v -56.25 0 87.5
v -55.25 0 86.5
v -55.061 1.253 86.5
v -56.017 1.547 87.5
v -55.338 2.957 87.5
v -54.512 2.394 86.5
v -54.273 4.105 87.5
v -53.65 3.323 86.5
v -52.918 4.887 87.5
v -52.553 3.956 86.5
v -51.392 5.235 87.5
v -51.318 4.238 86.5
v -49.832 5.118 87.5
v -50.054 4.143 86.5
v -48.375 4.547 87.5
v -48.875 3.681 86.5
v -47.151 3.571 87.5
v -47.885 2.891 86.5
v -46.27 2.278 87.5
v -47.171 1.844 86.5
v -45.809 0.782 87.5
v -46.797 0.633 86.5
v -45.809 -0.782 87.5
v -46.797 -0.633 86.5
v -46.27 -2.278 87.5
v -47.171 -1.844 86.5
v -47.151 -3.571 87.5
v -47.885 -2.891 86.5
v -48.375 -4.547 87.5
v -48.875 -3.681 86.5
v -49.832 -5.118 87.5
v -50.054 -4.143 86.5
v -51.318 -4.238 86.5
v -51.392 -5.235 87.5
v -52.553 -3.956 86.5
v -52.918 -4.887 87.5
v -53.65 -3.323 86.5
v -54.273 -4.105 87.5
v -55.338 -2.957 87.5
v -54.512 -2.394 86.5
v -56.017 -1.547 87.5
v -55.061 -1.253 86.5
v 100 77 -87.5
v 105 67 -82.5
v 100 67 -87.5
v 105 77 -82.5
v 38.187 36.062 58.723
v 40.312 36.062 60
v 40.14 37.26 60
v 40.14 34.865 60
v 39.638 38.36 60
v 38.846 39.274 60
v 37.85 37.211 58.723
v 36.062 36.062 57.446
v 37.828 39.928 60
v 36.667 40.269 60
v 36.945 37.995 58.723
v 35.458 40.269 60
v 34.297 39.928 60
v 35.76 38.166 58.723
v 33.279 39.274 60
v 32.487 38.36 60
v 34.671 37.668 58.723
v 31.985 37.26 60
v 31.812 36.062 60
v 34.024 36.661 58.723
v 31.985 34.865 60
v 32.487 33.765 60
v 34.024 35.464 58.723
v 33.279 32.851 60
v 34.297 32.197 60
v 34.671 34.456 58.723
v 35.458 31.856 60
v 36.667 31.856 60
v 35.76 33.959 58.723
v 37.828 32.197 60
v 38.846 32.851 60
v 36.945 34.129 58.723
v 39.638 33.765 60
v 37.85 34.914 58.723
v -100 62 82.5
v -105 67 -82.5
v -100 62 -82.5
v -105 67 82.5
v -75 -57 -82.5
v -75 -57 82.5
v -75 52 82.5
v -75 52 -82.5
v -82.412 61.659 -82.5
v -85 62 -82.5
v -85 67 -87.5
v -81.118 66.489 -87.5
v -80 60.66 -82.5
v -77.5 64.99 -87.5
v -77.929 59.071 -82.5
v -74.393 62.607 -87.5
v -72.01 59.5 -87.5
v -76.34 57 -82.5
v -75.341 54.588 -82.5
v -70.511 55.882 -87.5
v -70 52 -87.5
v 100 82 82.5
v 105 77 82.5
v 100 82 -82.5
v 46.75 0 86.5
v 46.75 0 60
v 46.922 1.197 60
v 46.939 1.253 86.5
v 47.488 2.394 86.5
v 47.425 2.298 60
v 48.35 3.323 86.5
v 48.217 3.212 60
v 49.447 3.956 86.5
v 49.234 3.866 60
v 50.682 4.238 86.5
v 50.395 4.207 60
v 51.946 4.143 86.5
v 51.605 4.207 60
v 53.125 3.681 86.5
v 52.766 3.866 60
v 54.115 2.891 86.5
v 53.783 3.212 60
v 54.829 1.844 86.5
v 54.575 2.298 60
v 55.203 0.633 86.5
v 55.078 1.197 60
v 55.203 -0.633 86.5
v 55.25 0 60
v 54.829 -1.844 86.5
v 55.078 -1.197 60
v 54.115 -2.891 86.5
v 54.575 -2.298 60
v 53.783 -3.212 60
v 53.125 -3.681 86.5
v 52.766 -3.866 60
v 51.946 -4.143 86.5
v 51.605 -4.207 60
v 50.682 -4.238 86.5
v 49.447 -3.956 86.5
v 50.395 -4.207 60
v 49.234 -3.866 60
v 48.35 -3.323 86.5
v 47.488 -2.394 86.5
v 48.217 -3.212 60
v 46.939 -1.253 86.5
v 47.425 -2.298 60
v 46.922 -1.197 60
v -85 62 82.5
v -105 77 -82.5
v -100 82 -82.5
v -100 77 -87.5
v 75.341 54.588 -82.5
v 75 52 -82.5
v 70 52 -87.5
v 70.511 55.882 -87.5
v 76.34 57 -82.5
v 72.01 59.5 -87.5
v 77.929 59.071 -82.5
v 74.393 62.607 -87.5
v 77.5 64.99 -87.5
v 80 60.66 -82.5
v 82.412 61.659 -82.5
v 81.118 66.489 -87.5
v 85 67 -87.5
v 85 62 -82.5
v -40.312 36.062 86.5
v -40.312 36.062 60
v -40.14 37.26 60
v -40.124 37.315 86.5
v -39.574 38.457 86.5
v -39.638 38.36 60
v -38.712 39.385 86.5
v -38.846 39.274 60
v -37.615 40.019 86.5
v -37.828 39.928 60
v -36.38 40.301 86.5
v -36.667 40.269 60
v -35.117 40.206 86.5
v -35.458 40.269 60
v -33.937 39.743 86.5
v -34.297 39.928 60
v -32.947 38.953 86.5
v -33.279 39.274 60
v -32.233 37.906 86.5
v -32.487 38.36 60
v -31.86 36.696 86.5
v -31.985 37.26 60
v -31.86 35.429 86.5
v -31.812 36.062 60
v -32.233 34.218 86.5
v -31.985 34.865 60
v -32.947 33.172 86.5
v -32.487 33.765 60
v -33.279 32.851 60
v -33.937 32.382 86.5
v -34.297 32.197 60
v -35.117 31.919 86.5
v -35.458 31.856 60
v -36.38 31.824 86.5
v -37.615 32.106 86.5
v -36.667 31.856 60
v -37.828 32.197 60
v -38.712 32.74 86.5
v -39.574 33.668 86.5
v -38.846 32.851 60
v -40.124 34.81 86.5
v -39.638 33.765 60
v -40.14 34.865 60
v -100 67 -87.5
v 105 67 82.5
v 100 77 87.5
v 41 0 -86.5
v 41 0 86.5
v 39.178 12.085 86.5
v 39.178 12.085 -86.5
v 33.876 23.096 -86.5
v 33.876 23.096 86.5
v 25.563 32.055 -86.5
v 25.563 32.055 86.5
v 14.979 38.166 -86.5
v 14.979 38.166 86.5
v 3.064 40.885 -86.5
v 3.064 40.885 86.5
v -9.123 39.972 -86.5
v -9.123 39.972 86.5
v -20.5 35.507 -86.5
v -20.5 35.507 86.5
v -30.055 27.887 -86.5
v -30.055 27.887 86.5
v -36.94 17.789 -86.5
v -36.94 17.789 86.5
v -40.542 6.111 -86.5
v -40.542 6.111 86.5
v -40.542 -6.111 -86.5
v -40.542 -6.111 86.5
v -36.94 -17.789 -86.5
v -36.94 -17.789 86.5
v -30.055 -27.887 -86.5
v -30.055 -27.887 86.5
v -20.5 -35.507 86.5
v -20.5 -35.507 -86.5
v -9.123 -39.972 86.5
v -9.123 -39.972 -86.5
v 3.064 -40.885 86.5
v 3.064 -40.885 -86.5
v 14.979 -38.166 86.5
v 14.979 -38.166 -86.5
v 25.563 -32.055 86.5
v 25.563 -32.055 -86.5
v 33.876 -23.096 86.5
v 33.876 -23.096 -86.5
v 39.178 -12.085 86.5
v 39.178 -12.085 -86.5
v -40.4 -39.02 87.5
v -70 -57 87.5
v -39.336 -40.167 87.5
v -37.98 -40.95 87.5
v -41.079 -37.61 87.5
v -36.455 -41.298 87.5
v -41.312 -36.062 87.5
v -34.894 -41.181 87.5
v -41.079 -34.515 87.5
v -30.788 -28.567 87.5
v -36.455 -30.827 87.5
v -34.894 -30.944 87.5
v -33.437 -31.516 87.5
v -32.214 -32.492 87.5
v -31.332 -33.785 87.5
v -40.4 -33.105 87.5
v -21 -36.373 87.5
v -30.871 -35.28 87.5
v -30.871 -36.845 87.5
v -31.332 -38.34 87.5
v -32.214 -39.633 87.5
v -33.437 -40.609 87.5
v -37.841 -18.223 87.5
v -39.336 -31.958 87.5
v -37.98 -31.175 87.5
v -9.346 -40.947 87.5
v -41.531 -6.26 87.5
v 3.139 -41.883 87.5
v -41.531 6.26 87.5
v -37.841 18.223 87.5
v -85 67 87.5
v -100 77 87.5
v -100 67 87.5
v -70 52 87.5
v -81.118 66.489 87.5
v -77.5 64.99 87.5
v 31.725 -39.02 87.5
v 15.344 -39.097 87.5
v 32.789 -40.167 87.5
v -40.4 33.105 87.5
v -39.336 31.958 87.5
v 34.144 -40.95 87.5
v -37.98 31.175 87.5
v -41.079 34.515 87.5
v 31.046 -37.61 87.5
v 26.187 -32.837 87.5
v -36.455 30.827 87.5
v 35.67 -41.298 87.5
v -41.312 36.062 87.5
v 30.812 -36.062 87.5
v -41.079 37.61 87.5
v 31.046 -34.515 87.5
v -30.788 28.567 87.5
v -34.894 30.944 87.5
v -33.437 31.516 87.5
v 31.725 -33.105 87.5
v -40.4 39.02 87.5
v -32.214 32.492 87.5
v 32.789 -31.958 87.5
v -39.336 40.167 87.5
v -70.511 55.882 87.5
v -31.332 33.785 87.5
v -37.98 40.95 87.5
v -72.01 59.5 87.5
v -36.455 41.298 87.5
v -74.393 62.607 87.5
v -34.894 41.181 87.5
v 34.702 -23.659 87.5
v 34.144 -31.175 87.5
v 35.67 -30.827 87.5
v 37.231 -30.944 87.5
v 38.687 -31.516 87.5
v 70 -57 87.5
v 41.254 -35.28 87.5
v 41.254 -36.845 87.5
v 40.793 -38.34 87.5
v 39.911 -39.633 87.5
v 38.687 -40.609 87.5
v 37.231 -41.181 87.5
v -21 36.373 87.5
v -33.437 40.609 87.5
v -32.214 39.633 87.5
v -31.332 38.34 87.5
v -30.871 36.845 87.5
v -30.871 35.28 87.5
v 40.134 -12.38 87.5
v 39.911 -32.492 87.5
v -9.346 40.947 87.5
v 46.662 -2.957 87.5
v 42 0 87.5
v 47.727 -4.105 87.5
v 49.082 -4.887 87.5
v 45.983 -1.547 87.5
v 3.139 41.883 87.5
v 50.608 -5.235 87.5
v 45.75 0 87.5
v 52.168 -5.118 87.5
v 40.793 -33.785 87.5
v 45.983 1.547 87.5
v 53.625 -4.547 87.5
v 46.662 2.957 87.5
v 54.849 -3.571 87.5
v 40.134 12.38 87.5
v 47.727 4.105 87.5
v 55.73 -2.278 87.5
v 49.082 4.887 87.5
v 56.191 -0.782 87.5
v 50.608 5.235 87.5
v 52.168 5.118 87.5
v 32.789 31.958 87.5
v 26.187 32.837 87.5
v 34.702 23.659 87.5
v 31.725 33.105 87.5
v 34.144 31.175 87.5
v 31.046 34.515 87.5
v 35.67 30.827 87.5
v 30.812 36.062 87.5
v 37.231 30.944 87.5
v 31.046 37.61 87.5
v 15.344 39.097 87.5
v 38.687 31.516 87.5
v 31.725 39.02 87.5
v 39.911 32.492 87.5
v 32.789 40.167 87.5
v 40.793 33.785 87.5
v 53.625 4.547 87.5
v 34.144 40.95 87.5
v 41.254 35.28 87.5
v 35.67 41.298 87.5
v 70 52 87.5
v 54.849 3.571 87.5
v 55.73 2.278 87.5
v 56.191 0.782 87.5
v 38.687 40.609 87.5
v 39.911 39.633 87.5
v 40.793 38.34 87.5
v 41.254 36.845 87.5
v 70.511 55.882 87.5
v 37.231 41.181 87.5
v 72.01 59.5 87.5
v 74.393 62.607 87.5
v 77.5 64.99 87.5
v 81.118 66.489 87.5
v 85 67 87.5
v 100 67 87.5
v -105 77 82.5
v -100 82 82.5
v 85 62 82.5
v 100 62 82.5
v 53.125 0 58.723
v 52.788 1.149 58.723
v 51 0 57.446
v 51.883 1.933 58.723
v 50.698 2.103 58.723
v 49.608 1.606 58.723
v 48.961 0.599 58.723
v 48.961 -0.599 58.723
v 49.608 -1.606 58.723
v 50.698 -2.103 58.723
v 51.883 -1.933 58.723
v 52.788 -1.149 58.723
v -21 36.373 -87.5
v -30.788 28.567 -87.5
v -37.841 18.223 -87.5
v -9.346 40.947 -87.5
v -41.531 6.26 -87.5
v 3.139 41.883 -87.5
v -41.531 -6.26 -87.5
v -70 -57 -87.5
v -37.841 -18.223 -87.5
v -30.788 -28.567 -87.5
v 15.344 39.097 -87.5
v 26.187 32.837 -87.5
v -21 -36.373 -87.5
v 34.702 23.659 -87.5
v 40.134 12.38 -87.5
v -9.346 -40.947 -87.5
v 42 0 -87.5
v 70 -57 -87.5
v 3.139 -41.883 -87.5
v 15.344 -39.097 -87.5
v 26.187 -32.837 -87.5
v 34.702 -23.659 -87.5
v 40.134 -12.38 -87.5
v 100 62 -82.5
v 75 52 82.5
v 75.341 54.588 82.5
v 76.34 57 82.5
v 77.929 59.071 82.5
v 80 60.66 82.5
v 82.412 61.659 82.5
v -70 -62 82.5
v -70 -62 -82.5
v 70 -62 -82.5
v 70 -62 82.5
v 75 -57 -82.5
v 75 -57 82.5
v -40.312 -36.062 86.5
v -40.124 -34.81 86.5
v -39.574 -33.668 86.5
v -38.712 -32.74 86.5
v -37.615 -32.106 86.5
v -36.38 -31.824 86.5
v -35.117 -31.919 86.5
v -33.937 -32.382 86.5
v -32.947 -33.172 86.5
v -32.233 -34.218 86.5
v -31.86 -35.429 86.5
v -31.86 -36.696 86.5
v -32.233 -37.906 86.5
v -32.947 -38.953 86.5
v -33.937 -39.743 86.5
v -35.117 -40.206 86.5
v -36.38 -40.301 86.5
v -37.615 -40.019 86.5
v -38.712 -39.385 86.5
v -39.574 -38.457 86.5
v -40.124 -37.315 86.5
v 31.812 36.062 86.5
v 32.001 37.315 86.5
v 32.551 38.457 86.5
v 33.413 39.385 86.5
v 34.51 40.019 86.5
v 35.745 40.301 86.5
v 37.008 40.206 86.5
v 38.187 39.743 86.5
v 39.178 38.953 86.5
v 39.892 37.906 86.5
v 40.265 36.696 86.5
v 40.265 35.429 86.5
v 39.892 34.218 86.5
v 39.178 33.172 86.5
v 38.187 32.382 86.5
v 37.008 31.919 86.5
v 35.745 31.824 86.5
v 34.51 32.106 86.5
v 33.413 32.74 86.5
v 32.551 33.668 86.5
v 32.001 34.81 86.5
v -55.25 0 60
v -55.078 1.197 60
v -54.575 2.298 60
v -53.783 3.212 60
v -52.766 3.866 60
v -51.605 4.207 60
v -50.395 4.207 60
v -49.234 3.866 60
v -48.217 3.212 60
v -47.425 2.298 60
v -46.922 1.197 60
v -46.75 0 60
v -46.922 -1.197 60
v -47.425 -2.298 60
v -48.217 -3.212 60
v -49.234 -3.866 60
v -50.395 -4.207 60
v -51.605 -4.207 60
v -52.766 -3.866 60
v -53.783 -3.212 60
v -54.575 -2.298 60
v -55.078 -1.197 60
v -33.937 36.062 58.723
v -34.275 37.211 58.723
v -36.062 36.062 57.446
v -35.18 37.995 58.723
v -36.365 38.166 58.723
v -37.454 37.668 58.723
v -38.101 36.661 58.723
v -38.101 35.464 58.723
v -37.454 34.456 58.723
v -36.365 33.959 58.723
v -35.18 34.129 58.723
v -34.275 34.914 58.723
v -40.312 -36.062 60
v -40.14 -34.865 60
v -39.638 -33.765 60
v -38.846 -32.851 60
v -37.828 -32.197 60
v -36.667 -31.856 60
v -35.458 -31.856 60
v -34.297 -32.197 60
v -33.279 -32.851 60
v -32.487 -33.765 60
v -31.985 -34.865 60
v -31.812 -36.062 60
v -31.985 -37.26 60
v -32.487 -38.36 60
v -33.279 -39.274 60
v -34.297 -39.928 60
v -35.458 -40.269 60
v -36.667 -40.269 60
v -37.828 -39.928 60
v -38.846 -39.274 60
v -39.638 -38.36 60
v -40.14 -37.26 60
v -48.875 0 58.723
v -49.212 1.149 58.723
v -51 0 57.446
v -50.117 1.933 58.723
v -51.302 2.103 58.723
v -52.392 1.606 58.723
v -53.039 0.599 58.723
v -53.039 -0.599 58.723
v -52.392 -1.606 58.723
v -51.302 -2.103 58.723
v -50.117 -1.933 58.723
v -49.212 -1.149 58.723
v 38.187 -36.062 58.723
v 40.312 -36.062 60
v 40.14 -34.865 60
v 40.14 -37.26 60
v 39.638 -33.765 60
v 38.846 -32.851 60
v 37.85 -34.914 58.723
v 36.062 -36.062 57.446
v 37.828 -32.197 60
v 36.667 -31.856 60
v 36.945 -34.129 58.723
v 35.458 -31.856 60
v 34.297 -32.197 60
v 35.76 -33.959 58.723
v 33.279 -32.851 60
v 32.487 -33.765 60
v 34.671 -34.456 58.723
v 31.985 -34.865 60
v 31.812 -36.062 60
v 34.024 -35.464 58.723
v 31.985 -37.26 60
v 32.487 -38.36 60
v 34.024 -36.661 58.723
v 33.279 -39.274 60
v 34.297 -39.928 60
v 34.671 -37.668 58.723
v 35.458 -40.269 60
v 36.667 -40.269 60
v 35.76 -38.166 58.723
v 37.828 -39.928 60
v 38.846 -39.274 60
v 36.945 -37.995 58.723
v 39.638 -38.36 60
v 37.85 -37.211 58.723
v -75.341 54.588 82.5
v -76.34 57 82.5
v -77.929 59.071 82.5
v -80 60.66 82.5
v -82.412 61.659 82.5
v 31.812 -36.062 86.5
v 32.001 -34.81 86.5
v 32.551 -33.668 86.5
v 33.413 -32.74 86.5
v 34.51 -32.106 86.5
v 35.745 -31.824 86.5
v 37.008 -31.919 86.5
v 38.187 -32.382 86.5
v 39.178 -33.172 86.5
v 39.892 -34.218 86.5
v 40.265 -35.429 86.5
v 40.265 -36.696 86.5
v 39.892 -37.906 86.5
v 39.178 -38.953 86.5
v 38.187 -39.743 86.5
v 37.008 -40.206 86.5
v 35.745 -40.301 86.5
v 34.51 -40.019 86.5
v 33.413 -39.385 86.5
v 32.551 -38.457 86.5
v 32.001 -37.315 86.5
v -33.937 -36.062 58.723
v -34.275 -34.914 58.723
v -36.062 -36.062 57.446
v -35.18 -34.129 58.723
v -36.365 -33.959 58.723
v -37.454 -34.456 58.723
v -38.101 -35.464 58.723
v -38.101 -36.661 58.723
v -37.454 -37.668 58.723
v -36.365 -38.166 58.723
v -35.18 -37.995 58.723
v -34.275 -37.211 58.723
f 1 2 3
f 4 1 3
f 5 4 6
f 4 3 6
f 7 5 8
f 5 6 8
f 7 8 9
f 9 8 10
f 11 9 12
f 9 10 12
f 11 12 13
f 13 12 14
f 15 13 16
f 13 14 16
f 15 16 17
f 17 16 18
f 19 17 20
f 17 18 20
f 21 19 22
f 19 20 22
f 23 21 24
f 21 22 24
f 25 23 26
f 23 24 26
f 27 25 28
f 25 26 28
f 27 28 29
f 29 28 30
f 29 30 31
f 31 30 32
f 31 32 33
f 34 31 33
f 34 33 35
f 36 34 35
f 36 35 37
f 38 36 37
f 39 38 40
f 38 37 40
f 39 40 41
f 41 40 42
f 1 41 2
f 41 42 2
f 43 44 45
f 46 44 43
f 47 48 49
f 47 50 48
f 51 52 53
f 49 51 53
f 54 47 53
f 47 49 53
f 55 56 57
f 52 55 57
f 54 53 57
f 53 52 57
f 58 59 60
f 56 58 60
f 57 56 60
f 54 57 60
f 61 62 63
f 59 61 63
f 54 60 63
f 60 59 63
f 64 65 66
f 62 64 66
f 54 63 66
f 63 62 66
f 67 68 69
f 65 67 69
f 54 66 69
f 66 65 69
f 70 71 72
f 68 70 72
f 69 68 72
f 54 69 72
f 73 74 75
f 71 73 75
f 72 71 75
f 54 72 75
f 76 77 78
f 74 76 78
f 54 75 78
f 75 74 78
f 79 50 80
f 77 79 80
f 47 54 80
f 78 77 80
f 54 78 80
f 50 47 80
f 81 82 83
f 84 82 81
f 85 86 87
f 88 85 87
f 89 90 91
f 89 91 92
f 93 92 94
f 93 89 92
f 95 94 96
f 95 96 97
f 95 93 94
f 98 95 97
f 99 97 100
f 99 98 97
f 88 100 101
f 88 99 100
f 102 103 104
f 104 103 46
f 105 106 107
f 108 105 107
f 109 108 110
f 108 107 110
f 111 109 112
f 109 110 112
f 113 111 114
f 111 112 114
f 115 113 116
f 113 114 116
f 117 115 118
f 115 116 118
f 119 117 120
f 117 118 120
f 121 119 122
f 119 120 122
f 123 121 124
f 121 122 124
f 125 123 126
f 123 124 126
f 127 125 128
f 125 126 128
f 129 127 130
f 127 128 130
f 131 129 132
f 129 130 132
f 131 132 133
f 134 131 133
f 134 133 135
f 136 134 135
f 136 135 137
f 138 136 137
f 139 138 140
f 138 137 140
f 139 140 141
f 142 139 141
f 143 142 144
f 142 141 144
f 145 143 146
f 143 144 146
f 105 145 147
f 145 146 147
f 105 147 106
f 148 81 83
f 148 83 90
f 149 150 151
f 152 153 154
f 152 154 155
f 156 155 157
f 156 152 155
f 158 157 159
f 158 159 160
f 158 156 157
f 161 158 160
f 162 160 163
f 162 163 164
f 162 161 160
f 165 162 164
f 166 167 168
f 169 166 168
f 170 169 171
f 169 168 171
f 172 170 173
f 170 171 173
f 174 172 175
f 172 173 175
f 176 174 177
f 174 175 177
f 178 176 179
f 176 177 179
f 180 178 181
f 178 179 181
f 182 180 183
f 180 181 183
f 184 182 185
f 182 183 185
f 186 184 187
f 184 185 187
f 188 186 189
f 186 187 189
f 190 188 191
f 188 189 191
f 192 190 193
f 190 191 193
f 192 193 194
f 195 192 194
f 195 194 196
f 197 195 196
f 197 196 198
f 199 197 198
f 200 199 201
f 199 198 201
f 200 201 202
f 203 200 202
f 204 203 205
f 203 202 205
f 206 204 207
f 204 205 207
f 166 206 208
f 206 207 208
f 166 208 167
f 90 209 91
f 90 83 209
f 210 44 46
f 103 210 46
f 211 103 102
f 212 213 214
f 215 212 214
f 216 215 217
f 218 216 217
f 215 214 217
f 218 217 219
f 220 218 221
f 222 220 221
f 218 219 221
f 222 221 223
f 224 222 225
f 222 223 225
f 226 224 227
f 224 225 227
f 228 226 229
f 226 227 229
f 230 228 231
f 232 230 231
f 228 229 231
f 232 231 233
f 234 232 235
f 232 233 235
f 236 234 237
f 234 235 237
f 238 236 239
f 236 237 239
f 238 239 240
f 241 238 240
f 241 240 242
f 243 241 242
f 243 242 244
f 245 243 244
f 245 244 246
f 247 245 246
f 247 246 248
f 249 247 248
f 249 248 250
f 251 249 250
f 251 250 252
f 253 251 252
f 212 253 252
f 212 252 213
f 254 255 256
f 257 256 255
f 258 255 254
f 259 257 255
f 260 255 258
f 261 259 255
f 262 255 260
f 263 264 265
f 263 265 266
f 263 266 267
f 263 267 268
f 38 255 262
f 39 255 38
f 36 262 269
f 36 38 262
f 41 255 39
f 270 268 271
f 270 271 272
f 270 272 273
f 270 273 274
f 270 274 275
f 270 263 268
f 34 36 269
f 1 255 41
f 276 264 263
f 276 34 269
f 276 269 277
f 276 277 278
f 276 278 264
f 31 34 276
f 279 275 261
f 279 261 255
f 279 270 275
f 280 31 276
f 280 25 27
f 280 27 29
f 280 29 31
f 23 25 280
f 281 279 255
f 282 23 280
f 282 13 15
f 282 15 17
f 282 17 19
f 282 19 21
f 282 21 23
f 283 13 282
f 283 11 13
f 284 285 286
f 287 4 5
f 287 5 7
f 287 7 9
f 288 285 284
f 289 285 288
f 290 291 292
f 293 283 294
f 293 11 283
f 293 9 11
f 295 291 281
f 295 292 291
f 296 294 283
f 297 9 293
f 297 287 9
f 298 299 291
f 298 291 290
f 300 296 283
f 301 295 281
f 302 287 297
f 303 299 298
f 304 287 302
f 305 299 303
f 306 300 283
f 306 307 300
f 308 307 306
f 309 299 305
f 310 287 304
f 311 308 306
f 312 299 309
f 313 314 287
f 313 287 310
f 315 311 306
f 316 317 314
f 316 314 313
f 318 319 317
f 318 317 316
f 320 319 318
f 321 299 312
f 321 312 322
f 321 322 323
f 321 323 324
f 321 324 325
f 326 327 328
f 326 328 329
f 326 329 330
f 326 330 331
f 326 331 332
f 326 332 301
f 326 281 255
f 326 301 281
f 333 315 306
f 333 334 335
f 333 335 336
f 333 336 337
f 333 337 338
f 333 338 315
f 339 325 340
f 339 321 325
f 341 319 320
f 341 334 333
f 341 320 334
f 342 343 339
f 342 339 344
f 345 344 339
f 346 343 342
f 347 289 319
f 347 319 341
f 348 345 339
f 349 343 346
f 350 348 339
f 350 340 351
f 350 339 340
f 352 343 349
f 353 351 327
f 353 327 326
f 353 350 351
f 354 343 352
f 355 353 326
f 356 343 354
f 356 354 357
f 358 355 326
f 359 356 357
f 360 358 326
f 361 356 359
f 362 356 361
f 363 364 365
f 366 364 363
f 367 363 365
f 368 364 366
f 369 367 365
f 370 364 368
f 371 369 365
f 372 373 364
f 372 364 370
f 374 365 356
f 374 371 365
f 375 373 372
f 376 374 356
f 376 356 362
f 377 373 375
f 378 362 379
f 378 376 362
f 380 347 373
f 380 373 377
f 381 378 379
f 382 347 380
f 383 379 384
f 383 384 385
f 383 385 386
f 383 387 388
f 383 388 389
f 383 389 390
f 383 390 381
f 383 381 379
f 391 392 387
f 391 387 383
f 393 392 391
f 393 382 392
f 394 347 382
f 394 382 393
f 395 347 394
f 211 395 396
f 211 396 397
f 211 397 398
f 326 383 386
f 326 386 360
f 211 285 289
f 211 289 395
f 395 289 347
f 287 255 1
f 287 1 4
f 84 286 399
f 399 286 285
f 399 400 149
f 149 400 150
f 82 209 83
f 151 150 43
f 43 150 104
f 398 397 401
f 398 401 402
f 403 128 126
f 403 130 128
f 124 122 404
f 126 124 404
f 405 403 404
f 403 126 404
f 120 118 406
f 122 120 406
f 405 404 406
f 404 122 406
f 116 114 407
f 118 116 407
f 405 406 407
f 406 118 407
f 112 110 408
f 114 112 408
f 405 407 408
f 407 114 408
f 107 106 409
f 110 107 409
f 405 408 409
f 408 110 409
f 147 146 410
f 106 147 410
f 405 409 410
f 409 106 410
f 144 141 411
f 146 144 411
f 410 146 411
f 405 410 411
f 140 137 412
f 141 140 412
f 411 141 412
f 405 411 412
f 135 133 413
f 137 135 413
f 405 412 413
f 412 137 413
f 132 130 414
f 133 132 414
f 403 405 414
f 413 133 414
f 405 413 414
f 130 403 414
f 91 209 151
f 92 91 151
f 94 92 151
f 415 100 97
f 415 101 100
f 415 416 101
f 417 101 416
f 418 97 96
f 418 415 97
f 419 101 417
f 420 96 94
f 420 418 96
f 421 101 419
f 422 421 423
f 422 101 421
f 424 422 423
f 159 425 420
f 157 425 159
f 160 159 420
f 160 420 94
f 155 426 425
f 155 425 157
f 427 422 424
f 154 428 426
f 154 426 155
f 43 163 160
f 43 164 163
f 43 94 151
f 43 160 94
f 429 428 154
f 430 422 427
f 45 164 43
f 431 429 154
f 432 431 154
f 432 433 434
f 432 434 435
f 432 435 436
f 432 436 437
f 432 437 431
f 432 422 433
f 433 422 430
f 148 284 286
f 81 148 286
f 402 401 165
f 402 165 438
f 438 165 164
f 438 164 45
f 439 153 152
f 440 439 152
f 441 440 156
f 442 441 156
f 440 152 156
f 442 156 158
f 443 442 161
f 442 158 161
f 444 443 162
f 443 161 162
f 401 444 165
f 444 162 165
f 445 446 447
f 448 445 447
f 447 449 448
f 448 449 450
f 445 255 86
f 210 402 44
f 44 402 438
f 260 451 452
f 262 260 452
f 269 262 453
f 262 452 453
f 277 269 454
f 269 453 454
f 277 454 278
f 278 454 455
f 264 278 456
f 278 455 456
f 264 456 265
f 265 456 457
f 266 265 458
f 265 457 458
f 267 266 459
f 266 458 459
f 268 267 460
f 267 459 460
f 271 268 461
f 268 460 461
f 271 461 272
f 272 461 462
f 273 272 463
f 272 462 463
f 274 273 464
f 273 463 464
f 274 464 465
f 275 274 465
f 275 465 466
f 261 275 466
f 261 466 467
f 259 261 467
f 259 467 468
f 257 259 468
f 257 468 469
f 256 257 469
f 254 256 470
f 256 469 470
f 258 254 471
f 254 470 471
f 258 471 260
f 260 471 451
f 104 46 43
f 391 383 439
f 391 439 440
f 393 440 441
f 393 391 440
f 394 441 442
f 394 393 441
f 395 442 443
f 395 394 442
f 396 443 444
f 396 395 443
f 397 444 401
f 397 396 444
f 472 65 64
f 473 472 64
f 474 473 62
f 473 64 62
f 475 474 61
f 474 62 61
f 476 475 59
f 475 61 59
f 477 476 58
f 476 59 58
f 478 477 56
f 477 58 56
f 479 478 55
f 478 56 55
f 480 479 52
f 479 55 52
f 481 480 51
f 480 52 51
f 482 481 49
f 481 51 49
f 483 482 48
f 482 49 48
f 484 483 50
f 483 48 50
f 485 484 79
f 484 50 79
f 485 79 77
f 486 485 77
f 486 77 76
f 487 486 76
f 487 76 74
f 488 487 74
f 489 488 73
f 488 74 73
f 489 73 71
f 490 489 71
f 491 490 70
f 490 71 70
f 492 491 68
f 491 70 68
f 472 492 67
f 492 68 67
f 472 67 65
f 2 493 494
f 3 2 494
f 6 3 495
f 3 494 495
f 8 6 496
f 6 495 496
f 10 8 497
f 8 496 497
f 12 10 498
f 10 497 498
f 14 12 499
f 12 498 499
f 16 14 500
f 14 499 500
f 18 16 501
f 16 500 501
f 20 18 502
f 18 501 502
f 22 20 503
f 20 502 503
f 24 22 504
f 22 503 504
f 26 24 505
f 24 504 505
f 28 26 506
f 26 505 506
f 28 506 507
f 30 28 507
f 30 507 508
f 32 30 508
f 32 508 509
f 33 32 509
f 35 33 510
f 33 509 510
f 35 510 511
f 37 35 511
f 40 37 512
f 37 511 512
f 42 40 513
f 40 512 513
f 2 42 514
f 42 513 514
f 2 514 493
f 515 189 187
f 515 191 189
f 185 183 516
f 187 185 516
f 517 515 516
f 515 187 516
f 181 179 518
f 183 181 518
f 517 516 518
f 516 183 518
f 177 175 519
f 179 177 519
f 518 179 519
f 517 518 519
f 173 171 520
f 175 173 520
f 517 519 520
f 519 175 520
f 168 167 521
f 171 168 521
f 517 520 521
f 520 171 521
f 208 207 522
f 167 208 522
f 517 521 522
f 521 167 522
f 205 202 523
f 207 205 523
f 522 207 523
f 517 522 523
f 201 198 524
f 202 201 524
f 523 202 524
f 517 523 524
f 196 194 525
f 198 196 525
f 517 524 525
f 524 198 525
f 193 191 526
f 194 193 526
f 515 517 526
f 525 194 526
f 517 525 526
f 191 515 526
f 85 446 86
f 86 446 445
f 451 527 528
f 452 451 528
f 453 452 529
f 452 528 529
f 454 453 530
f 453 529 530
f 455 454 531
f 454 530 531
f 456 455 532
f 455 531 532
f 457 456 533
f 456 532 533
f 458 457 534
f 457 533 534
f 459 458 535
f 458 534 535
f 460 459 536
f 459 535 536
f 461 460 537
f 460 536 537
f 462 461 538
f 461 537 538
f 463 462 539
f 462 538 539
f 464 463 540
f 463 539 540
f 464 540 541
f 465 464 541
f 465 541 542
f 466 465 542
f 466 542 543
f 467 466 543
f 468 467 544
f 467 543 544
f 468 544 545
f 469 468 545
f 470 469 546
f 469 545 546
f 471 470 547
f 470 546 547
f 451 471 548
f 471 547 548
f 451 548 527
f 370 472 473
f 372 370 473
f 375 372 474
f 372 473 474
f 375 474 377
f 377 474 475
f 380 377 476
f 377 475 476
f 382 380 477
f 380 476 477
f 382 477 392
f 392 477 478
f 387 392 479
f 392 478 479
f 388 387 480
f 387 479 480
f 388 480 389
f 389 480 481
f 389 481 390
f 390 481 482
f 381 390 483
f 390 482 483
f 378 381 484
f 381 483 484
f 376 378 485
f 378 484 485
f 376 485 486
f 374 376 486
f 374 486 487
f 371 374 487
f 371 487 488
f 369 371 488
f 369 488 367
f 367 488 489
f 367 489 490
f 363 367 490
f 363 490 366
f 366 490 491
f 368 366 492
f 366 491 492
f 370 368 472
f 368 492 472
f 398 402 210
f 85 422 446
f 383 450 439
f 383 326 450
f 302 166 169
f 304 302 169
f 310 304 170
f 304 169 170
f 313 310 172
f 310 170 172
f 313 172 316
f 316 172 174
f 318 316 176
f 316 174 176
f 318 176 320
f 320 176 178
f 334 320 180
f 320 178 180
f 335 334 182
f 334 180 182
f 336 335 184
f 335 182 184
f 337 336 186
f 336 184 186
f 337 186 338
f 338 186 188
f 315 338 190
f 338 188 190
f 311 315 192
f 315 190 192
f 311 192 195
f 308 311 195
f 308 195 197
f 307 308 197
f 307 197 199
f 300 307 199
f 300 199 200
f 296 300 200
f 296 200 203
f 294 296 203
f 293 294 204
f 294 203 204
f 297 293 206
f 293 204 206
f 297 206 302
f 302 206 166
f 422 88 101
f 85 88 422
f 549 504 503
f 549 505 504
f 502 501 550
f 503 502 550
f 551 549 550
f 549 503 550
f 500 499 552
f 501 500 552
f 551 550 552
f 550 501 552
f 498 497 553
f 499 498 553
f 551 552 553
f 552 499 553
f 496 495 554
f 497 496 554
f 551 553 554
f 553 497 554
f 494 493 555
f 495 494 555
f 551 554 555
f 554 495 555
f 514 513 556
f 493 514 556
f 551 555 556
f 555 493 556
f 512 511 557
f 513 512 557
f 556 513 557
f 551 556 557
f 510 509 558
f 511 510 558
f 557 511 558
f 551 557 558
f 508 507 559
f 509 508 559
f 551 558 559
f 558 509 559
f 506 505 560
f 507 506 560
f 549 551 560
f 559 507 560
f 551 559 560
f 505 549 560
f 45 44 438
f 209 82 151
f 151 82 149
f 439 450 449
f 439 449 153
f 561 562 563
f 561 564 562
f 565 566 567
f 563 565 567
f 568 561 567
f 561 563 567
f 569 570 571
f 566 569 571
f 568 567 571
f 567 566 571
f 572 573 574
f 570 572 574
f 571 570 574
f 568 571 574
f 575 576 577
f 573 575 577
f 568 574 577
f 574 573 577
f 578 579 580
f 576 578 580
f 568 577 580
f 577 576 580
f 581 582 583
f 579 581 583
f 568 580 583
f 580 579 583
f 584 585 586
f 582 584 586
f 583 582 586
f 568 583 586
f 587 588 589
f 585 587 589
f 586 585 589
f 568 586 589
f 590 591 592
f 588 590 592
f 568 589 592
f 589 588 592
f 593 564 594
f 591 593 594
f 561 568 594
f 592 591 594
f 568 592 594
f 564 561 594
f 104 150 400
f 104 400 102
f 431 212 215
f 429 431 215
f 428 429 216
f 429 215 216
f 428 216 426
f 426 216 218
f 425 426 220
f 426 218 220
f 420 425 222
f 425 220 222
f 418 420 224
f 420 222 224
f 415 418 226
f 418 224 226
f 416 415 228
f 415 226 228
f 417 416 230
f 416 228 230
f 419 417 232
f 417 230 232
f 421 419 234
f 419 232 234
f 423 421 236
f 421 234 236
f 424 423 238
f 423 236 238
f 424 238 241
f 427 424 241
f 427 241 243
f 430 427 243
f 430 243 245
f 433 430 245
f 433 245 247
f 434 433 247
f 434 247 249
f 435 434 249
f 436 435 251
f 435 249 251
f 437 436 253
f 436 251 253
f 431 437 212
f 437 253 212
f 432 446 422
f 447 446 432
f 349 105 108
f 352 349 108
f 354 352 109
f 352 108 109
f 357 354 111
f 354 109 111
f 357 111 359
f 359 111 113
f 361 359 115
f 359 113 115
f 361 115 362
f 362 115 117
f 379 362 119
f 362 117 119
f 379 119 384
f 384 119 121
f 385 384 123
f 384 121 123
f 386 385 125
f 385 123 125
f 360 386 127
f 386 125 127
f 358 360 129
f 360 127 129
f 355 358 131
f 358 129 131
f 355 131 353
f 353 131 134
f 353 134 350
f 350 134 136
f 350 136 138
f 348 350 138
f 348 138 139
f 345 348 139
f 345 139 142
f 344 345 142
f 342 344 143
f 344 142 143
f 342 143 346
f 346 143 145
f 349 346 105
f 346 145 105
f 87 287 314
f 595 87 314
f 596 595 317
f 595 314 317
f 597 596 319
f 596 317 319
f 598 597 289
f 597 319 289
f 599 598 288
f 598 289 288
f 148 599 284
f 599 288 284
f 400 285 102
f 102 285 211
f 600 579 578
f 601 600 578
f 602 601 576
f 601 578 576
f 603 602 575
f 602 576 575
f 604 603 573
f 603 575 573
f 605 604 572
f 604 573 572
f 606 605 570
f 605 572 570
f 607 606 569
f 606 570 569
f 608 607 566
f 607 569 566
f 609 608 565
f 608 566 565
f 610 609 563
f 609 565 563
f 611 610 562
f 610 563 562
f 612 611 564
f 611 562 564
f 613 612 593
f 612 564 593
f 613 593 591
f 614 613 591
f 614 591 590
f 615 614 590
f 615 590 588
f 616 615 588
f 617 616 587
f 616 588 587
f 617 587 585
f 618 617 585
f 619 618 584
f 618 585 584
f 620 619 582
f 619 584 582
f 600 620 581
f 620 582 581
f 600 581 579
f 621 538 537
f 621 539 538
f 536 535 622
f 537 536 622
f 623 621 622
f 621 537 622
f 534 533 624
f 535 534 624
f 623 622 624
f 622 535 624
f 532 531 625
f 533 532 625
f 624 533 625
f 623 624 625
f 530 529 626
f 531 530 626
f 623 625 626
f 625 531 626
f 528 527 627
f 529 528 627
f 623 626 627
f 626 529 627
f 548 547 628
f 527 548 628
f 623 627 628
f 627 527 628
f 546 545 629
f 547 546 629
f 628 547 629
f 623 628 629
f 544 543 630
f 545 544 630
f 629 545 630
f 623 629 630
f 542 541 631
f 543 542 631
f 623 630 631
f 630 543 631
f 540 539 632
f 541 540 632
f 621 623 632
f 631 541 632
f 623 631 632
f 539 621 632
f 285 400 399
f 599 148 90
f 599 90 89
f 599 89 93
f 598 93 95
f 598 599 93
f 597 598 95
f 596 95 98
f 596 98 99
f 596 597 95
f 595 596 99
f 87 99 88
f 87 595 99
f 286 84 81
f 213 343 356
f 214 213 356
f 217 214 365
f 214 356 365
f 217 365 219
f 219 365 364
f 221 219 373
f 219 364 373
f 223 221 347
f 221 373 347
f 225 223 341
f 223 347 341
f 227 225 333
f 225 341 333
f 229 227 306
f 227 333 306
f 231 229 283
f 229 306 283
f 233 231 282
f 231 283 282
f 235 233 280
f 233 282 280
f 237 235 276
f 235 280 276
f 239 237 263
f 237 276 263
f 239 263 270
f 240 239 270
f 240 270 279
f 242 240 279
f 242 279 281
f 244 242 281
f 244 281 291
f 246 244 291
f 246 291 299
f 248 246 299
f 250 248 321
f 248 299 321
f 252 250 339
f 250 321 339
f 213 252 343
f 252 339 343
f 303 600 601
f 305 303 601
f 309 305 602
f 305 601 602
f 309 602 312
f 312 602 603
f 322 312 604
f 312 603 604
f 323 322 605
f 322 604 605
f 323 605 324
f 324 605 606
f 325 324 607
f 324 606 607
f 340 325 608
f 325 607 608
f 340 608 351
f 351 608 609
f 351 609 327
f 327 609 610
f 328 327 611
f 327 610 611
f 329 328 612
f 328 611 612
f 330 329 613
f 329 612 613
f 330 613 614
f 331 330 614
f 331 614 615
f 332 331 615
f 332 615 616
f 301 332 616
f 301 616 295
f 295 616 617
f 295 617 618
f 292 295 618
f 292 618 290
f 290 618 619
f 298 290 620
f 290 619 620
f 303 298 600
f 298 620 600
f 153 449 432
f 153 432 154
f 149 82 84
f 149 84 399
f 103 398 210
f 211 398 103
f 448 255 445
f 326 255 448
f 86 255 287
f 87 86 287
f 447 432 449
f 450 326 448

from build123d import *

# Parameters (mm, degrees)
SKETCH1_W                       = 150
SKETCH1_H                       = 124
BOSS_EXTRUDE1_DEPTH             = 87.5
BOSS_EXTRUDE2_REACH             = 132.863
SKETCH8_W                       = 210
SKETCH8_H                       = 20
BOSS_EXTRUDE2_DIRECTION_2_REACH = 132.863
CUT_EXTRUDE1_REACH              = 221.941
SKETCH2_R                       = 41
M10_TAPPED_HOLE1_D              = 8.5
M10_TAPPED_HOLE1_DEPTH          = 27.5
M10_TAPPED_HOLE1_TIP            = 2.553657631
FILLET1_R                       = 10
CHAMFER1_SIZE                   = 5
CHAMFER2_SIZE                   = 1


with BuildPart() as part:
    # Sketch1 → Boss-Extrude1 (new, symmetric)
    with BuildSketch(Plane.XY):
        Rectangle(SKETCH1_W, SKETCH1_H)
    extrude(amount=BOSS_EXTRUDE1_DEPTH, both=True)

    # Boss-Extrude2: up to this face of the body (flat: up to its plane)
    boss_extrude2_end = Plane(part.part.faces().sort_by_distance((0, 0, -87.5))[0])
    # Sketch8 → Boss-Extrude2 (add, up to the picked face)
    with BuildSketch(Plane.XY, mode=Mode.PRIVATE) as boss_extrude2_sk1:
        with Locations((0, 72)):
            Rectangle(SKETCH8_W, SKETCH8_H)
    boss_extrude2_tool1 = split(extrude(boss_extrude2_sk1.sketch, amount=-BOSS_EXTRUDE2_REACH, mode=Mode.PRIVATE), bisect_by=boss_extrude2_end, keep=Keep.BOTH, mode=Mode.PRIVATE)
    add(boss_extrude2_tool1.solids().sort_by(Axis((0, 72, 0), (0, 0, -1)))[0])

    # Boss-Extrude2 direction 2: up to this face of the body (flat: up to its plane)
    boss_extrude2_direction_2_end = Plane(part.part.faces().sort_by_distance((0, 0, 87.5))[0])
    # Sketch8 → Boss-Extrude2 direction 2 (add, up to the picked face)
    with BuildSketch(Plane.XY, mode=Mode.PRIVATE) as boss_extrude2_direction_2_sk1:
        with Locations((0, 72)):
            Rectangle(SKETCH8_W, SKETCH8_H)
    boss_extrude2_direction_2_tool1 = split(extrude(boss_extrude2_direction_2_sk1.sketch, amount=BOSS_EXTRUDE2_DIRECTION_2_REACH, mode=Mode.PRIVATE), bisect_by=boss_extrude2_direction_2_end, keep=Keep.BOTH, mode=Mode.PRIVATE)
    add(boss_extrude2_direction_2_tool1.solids().sort_by(Axis((0, 72, 0), (0, 0, 1)))[0])

    # Sketch2 → Cut-Extrude1 (cut, up to next)
    with BuildSketch(Plane.XY.offset(87.5), mode=Mode.PRIVATE) as cut_extrude1_sk1:
        Circle(SKETCH2_R)
    cut_extrude1_tool1 = extrude(cut_extrude1_sk1.sketch, amount=-CUT_EXTRUDE1_REACH, mode=Mode.PRIVATE) & part.part
    add(cut_extrude1_tool1.solids().sort_by_distance((0, 0, 87.5))[0], mode=Mode.SUBTRACT)

    # M10 Tapped Hole1
    with Locations(Plane.XY.offset(87.5)):
        with Locations((-36.062445841, -36.062445841), (-36.062445841, 36.062445841), (-51, 0), (36.062445841, 36.062445841), (51, 0), (36.062445841, -36.062445841)):
            Hole(M10_TAPPED_HOLE1_D / 2, depth=M10_TAPPED_HOLE1_DEPTH)
            with Locations((0, 0, -(M10_TAPPED_HOLE1_DEPTH + M10_TAPPED_HOLE1_TIP / 2))):  # 118° drill point
                Cone(0, M10_TAPPED_HOLE1_D / 2, M10_TAPPED_HOLE1_TIP, mode=Mode.SUBTRACT)

    # Fillet1
    fillet1_edges = [part.edges().sort_by_distance(p)[0] for p in [
        (-75, 62, 0),
        (75, 62, 0),
    ]]
    fillet(fillet1_edges, radius=FILLET1_R)

    # Chamfer1
    chamfer1_edges = [part.edges().sort_by_distance(p)[0] for p in [
        (-95, 62, -87.5),
        (95, 62, 87.5),
        (105, 62, 0),
        (105, 72, -87.5),
        (105, 82, 0),
        (105, 72, 87.5),
        (0, 82, -87.5),
        (-105, 82, 0),
        (0, 82, 87.5),
        (-105, 72, -87.5),
        (-105, 62, 0),
        (-105, 72, 87.5),
        (0, -62, 87.5),
        (75, -5, 87.5),
        (0, -62, -87.5),
        (75, -5, -87.5),
        (-75, -5, -87.5),
        (-75, -5, 87.5),
        (-95, 62, 87.5),
        (95, 62, -87.5),
        (-77.928932188, 59.071067812, -87.5),
        (-77.928932188, 59.071067812, 87.5),
        (77.928932188, 59.071067812, -87.5),
        (77.928932188, 59.071067812, 87.5),
        (75, -62, 0),
        (-75, -62, 0),
    ]]
    chamfer(chamfer1_edges, length=CHAMFER1_SIZE)

    # Chamfer2
    chamfer2_edges = [part.edges().sort_by_distance(p)[0] for p in [
        (-41, 0, -87.5),
        (-41, 0, 87.5),
        (-31.812445841, -36.062445841, 87.5),
        (-46.75, 0, 87.5),
        (-31.812445841, 36.062445841, 87.5),
        (40.312445841, -36.062445841, 87.5),
        (55.25, 0, 87.5),
        (40.312445841, 36.062445841, 87.5),
    ]]
    chamfer(chamfer2_edges, length=CHAMFER2_SIZE)


solid = part.part
